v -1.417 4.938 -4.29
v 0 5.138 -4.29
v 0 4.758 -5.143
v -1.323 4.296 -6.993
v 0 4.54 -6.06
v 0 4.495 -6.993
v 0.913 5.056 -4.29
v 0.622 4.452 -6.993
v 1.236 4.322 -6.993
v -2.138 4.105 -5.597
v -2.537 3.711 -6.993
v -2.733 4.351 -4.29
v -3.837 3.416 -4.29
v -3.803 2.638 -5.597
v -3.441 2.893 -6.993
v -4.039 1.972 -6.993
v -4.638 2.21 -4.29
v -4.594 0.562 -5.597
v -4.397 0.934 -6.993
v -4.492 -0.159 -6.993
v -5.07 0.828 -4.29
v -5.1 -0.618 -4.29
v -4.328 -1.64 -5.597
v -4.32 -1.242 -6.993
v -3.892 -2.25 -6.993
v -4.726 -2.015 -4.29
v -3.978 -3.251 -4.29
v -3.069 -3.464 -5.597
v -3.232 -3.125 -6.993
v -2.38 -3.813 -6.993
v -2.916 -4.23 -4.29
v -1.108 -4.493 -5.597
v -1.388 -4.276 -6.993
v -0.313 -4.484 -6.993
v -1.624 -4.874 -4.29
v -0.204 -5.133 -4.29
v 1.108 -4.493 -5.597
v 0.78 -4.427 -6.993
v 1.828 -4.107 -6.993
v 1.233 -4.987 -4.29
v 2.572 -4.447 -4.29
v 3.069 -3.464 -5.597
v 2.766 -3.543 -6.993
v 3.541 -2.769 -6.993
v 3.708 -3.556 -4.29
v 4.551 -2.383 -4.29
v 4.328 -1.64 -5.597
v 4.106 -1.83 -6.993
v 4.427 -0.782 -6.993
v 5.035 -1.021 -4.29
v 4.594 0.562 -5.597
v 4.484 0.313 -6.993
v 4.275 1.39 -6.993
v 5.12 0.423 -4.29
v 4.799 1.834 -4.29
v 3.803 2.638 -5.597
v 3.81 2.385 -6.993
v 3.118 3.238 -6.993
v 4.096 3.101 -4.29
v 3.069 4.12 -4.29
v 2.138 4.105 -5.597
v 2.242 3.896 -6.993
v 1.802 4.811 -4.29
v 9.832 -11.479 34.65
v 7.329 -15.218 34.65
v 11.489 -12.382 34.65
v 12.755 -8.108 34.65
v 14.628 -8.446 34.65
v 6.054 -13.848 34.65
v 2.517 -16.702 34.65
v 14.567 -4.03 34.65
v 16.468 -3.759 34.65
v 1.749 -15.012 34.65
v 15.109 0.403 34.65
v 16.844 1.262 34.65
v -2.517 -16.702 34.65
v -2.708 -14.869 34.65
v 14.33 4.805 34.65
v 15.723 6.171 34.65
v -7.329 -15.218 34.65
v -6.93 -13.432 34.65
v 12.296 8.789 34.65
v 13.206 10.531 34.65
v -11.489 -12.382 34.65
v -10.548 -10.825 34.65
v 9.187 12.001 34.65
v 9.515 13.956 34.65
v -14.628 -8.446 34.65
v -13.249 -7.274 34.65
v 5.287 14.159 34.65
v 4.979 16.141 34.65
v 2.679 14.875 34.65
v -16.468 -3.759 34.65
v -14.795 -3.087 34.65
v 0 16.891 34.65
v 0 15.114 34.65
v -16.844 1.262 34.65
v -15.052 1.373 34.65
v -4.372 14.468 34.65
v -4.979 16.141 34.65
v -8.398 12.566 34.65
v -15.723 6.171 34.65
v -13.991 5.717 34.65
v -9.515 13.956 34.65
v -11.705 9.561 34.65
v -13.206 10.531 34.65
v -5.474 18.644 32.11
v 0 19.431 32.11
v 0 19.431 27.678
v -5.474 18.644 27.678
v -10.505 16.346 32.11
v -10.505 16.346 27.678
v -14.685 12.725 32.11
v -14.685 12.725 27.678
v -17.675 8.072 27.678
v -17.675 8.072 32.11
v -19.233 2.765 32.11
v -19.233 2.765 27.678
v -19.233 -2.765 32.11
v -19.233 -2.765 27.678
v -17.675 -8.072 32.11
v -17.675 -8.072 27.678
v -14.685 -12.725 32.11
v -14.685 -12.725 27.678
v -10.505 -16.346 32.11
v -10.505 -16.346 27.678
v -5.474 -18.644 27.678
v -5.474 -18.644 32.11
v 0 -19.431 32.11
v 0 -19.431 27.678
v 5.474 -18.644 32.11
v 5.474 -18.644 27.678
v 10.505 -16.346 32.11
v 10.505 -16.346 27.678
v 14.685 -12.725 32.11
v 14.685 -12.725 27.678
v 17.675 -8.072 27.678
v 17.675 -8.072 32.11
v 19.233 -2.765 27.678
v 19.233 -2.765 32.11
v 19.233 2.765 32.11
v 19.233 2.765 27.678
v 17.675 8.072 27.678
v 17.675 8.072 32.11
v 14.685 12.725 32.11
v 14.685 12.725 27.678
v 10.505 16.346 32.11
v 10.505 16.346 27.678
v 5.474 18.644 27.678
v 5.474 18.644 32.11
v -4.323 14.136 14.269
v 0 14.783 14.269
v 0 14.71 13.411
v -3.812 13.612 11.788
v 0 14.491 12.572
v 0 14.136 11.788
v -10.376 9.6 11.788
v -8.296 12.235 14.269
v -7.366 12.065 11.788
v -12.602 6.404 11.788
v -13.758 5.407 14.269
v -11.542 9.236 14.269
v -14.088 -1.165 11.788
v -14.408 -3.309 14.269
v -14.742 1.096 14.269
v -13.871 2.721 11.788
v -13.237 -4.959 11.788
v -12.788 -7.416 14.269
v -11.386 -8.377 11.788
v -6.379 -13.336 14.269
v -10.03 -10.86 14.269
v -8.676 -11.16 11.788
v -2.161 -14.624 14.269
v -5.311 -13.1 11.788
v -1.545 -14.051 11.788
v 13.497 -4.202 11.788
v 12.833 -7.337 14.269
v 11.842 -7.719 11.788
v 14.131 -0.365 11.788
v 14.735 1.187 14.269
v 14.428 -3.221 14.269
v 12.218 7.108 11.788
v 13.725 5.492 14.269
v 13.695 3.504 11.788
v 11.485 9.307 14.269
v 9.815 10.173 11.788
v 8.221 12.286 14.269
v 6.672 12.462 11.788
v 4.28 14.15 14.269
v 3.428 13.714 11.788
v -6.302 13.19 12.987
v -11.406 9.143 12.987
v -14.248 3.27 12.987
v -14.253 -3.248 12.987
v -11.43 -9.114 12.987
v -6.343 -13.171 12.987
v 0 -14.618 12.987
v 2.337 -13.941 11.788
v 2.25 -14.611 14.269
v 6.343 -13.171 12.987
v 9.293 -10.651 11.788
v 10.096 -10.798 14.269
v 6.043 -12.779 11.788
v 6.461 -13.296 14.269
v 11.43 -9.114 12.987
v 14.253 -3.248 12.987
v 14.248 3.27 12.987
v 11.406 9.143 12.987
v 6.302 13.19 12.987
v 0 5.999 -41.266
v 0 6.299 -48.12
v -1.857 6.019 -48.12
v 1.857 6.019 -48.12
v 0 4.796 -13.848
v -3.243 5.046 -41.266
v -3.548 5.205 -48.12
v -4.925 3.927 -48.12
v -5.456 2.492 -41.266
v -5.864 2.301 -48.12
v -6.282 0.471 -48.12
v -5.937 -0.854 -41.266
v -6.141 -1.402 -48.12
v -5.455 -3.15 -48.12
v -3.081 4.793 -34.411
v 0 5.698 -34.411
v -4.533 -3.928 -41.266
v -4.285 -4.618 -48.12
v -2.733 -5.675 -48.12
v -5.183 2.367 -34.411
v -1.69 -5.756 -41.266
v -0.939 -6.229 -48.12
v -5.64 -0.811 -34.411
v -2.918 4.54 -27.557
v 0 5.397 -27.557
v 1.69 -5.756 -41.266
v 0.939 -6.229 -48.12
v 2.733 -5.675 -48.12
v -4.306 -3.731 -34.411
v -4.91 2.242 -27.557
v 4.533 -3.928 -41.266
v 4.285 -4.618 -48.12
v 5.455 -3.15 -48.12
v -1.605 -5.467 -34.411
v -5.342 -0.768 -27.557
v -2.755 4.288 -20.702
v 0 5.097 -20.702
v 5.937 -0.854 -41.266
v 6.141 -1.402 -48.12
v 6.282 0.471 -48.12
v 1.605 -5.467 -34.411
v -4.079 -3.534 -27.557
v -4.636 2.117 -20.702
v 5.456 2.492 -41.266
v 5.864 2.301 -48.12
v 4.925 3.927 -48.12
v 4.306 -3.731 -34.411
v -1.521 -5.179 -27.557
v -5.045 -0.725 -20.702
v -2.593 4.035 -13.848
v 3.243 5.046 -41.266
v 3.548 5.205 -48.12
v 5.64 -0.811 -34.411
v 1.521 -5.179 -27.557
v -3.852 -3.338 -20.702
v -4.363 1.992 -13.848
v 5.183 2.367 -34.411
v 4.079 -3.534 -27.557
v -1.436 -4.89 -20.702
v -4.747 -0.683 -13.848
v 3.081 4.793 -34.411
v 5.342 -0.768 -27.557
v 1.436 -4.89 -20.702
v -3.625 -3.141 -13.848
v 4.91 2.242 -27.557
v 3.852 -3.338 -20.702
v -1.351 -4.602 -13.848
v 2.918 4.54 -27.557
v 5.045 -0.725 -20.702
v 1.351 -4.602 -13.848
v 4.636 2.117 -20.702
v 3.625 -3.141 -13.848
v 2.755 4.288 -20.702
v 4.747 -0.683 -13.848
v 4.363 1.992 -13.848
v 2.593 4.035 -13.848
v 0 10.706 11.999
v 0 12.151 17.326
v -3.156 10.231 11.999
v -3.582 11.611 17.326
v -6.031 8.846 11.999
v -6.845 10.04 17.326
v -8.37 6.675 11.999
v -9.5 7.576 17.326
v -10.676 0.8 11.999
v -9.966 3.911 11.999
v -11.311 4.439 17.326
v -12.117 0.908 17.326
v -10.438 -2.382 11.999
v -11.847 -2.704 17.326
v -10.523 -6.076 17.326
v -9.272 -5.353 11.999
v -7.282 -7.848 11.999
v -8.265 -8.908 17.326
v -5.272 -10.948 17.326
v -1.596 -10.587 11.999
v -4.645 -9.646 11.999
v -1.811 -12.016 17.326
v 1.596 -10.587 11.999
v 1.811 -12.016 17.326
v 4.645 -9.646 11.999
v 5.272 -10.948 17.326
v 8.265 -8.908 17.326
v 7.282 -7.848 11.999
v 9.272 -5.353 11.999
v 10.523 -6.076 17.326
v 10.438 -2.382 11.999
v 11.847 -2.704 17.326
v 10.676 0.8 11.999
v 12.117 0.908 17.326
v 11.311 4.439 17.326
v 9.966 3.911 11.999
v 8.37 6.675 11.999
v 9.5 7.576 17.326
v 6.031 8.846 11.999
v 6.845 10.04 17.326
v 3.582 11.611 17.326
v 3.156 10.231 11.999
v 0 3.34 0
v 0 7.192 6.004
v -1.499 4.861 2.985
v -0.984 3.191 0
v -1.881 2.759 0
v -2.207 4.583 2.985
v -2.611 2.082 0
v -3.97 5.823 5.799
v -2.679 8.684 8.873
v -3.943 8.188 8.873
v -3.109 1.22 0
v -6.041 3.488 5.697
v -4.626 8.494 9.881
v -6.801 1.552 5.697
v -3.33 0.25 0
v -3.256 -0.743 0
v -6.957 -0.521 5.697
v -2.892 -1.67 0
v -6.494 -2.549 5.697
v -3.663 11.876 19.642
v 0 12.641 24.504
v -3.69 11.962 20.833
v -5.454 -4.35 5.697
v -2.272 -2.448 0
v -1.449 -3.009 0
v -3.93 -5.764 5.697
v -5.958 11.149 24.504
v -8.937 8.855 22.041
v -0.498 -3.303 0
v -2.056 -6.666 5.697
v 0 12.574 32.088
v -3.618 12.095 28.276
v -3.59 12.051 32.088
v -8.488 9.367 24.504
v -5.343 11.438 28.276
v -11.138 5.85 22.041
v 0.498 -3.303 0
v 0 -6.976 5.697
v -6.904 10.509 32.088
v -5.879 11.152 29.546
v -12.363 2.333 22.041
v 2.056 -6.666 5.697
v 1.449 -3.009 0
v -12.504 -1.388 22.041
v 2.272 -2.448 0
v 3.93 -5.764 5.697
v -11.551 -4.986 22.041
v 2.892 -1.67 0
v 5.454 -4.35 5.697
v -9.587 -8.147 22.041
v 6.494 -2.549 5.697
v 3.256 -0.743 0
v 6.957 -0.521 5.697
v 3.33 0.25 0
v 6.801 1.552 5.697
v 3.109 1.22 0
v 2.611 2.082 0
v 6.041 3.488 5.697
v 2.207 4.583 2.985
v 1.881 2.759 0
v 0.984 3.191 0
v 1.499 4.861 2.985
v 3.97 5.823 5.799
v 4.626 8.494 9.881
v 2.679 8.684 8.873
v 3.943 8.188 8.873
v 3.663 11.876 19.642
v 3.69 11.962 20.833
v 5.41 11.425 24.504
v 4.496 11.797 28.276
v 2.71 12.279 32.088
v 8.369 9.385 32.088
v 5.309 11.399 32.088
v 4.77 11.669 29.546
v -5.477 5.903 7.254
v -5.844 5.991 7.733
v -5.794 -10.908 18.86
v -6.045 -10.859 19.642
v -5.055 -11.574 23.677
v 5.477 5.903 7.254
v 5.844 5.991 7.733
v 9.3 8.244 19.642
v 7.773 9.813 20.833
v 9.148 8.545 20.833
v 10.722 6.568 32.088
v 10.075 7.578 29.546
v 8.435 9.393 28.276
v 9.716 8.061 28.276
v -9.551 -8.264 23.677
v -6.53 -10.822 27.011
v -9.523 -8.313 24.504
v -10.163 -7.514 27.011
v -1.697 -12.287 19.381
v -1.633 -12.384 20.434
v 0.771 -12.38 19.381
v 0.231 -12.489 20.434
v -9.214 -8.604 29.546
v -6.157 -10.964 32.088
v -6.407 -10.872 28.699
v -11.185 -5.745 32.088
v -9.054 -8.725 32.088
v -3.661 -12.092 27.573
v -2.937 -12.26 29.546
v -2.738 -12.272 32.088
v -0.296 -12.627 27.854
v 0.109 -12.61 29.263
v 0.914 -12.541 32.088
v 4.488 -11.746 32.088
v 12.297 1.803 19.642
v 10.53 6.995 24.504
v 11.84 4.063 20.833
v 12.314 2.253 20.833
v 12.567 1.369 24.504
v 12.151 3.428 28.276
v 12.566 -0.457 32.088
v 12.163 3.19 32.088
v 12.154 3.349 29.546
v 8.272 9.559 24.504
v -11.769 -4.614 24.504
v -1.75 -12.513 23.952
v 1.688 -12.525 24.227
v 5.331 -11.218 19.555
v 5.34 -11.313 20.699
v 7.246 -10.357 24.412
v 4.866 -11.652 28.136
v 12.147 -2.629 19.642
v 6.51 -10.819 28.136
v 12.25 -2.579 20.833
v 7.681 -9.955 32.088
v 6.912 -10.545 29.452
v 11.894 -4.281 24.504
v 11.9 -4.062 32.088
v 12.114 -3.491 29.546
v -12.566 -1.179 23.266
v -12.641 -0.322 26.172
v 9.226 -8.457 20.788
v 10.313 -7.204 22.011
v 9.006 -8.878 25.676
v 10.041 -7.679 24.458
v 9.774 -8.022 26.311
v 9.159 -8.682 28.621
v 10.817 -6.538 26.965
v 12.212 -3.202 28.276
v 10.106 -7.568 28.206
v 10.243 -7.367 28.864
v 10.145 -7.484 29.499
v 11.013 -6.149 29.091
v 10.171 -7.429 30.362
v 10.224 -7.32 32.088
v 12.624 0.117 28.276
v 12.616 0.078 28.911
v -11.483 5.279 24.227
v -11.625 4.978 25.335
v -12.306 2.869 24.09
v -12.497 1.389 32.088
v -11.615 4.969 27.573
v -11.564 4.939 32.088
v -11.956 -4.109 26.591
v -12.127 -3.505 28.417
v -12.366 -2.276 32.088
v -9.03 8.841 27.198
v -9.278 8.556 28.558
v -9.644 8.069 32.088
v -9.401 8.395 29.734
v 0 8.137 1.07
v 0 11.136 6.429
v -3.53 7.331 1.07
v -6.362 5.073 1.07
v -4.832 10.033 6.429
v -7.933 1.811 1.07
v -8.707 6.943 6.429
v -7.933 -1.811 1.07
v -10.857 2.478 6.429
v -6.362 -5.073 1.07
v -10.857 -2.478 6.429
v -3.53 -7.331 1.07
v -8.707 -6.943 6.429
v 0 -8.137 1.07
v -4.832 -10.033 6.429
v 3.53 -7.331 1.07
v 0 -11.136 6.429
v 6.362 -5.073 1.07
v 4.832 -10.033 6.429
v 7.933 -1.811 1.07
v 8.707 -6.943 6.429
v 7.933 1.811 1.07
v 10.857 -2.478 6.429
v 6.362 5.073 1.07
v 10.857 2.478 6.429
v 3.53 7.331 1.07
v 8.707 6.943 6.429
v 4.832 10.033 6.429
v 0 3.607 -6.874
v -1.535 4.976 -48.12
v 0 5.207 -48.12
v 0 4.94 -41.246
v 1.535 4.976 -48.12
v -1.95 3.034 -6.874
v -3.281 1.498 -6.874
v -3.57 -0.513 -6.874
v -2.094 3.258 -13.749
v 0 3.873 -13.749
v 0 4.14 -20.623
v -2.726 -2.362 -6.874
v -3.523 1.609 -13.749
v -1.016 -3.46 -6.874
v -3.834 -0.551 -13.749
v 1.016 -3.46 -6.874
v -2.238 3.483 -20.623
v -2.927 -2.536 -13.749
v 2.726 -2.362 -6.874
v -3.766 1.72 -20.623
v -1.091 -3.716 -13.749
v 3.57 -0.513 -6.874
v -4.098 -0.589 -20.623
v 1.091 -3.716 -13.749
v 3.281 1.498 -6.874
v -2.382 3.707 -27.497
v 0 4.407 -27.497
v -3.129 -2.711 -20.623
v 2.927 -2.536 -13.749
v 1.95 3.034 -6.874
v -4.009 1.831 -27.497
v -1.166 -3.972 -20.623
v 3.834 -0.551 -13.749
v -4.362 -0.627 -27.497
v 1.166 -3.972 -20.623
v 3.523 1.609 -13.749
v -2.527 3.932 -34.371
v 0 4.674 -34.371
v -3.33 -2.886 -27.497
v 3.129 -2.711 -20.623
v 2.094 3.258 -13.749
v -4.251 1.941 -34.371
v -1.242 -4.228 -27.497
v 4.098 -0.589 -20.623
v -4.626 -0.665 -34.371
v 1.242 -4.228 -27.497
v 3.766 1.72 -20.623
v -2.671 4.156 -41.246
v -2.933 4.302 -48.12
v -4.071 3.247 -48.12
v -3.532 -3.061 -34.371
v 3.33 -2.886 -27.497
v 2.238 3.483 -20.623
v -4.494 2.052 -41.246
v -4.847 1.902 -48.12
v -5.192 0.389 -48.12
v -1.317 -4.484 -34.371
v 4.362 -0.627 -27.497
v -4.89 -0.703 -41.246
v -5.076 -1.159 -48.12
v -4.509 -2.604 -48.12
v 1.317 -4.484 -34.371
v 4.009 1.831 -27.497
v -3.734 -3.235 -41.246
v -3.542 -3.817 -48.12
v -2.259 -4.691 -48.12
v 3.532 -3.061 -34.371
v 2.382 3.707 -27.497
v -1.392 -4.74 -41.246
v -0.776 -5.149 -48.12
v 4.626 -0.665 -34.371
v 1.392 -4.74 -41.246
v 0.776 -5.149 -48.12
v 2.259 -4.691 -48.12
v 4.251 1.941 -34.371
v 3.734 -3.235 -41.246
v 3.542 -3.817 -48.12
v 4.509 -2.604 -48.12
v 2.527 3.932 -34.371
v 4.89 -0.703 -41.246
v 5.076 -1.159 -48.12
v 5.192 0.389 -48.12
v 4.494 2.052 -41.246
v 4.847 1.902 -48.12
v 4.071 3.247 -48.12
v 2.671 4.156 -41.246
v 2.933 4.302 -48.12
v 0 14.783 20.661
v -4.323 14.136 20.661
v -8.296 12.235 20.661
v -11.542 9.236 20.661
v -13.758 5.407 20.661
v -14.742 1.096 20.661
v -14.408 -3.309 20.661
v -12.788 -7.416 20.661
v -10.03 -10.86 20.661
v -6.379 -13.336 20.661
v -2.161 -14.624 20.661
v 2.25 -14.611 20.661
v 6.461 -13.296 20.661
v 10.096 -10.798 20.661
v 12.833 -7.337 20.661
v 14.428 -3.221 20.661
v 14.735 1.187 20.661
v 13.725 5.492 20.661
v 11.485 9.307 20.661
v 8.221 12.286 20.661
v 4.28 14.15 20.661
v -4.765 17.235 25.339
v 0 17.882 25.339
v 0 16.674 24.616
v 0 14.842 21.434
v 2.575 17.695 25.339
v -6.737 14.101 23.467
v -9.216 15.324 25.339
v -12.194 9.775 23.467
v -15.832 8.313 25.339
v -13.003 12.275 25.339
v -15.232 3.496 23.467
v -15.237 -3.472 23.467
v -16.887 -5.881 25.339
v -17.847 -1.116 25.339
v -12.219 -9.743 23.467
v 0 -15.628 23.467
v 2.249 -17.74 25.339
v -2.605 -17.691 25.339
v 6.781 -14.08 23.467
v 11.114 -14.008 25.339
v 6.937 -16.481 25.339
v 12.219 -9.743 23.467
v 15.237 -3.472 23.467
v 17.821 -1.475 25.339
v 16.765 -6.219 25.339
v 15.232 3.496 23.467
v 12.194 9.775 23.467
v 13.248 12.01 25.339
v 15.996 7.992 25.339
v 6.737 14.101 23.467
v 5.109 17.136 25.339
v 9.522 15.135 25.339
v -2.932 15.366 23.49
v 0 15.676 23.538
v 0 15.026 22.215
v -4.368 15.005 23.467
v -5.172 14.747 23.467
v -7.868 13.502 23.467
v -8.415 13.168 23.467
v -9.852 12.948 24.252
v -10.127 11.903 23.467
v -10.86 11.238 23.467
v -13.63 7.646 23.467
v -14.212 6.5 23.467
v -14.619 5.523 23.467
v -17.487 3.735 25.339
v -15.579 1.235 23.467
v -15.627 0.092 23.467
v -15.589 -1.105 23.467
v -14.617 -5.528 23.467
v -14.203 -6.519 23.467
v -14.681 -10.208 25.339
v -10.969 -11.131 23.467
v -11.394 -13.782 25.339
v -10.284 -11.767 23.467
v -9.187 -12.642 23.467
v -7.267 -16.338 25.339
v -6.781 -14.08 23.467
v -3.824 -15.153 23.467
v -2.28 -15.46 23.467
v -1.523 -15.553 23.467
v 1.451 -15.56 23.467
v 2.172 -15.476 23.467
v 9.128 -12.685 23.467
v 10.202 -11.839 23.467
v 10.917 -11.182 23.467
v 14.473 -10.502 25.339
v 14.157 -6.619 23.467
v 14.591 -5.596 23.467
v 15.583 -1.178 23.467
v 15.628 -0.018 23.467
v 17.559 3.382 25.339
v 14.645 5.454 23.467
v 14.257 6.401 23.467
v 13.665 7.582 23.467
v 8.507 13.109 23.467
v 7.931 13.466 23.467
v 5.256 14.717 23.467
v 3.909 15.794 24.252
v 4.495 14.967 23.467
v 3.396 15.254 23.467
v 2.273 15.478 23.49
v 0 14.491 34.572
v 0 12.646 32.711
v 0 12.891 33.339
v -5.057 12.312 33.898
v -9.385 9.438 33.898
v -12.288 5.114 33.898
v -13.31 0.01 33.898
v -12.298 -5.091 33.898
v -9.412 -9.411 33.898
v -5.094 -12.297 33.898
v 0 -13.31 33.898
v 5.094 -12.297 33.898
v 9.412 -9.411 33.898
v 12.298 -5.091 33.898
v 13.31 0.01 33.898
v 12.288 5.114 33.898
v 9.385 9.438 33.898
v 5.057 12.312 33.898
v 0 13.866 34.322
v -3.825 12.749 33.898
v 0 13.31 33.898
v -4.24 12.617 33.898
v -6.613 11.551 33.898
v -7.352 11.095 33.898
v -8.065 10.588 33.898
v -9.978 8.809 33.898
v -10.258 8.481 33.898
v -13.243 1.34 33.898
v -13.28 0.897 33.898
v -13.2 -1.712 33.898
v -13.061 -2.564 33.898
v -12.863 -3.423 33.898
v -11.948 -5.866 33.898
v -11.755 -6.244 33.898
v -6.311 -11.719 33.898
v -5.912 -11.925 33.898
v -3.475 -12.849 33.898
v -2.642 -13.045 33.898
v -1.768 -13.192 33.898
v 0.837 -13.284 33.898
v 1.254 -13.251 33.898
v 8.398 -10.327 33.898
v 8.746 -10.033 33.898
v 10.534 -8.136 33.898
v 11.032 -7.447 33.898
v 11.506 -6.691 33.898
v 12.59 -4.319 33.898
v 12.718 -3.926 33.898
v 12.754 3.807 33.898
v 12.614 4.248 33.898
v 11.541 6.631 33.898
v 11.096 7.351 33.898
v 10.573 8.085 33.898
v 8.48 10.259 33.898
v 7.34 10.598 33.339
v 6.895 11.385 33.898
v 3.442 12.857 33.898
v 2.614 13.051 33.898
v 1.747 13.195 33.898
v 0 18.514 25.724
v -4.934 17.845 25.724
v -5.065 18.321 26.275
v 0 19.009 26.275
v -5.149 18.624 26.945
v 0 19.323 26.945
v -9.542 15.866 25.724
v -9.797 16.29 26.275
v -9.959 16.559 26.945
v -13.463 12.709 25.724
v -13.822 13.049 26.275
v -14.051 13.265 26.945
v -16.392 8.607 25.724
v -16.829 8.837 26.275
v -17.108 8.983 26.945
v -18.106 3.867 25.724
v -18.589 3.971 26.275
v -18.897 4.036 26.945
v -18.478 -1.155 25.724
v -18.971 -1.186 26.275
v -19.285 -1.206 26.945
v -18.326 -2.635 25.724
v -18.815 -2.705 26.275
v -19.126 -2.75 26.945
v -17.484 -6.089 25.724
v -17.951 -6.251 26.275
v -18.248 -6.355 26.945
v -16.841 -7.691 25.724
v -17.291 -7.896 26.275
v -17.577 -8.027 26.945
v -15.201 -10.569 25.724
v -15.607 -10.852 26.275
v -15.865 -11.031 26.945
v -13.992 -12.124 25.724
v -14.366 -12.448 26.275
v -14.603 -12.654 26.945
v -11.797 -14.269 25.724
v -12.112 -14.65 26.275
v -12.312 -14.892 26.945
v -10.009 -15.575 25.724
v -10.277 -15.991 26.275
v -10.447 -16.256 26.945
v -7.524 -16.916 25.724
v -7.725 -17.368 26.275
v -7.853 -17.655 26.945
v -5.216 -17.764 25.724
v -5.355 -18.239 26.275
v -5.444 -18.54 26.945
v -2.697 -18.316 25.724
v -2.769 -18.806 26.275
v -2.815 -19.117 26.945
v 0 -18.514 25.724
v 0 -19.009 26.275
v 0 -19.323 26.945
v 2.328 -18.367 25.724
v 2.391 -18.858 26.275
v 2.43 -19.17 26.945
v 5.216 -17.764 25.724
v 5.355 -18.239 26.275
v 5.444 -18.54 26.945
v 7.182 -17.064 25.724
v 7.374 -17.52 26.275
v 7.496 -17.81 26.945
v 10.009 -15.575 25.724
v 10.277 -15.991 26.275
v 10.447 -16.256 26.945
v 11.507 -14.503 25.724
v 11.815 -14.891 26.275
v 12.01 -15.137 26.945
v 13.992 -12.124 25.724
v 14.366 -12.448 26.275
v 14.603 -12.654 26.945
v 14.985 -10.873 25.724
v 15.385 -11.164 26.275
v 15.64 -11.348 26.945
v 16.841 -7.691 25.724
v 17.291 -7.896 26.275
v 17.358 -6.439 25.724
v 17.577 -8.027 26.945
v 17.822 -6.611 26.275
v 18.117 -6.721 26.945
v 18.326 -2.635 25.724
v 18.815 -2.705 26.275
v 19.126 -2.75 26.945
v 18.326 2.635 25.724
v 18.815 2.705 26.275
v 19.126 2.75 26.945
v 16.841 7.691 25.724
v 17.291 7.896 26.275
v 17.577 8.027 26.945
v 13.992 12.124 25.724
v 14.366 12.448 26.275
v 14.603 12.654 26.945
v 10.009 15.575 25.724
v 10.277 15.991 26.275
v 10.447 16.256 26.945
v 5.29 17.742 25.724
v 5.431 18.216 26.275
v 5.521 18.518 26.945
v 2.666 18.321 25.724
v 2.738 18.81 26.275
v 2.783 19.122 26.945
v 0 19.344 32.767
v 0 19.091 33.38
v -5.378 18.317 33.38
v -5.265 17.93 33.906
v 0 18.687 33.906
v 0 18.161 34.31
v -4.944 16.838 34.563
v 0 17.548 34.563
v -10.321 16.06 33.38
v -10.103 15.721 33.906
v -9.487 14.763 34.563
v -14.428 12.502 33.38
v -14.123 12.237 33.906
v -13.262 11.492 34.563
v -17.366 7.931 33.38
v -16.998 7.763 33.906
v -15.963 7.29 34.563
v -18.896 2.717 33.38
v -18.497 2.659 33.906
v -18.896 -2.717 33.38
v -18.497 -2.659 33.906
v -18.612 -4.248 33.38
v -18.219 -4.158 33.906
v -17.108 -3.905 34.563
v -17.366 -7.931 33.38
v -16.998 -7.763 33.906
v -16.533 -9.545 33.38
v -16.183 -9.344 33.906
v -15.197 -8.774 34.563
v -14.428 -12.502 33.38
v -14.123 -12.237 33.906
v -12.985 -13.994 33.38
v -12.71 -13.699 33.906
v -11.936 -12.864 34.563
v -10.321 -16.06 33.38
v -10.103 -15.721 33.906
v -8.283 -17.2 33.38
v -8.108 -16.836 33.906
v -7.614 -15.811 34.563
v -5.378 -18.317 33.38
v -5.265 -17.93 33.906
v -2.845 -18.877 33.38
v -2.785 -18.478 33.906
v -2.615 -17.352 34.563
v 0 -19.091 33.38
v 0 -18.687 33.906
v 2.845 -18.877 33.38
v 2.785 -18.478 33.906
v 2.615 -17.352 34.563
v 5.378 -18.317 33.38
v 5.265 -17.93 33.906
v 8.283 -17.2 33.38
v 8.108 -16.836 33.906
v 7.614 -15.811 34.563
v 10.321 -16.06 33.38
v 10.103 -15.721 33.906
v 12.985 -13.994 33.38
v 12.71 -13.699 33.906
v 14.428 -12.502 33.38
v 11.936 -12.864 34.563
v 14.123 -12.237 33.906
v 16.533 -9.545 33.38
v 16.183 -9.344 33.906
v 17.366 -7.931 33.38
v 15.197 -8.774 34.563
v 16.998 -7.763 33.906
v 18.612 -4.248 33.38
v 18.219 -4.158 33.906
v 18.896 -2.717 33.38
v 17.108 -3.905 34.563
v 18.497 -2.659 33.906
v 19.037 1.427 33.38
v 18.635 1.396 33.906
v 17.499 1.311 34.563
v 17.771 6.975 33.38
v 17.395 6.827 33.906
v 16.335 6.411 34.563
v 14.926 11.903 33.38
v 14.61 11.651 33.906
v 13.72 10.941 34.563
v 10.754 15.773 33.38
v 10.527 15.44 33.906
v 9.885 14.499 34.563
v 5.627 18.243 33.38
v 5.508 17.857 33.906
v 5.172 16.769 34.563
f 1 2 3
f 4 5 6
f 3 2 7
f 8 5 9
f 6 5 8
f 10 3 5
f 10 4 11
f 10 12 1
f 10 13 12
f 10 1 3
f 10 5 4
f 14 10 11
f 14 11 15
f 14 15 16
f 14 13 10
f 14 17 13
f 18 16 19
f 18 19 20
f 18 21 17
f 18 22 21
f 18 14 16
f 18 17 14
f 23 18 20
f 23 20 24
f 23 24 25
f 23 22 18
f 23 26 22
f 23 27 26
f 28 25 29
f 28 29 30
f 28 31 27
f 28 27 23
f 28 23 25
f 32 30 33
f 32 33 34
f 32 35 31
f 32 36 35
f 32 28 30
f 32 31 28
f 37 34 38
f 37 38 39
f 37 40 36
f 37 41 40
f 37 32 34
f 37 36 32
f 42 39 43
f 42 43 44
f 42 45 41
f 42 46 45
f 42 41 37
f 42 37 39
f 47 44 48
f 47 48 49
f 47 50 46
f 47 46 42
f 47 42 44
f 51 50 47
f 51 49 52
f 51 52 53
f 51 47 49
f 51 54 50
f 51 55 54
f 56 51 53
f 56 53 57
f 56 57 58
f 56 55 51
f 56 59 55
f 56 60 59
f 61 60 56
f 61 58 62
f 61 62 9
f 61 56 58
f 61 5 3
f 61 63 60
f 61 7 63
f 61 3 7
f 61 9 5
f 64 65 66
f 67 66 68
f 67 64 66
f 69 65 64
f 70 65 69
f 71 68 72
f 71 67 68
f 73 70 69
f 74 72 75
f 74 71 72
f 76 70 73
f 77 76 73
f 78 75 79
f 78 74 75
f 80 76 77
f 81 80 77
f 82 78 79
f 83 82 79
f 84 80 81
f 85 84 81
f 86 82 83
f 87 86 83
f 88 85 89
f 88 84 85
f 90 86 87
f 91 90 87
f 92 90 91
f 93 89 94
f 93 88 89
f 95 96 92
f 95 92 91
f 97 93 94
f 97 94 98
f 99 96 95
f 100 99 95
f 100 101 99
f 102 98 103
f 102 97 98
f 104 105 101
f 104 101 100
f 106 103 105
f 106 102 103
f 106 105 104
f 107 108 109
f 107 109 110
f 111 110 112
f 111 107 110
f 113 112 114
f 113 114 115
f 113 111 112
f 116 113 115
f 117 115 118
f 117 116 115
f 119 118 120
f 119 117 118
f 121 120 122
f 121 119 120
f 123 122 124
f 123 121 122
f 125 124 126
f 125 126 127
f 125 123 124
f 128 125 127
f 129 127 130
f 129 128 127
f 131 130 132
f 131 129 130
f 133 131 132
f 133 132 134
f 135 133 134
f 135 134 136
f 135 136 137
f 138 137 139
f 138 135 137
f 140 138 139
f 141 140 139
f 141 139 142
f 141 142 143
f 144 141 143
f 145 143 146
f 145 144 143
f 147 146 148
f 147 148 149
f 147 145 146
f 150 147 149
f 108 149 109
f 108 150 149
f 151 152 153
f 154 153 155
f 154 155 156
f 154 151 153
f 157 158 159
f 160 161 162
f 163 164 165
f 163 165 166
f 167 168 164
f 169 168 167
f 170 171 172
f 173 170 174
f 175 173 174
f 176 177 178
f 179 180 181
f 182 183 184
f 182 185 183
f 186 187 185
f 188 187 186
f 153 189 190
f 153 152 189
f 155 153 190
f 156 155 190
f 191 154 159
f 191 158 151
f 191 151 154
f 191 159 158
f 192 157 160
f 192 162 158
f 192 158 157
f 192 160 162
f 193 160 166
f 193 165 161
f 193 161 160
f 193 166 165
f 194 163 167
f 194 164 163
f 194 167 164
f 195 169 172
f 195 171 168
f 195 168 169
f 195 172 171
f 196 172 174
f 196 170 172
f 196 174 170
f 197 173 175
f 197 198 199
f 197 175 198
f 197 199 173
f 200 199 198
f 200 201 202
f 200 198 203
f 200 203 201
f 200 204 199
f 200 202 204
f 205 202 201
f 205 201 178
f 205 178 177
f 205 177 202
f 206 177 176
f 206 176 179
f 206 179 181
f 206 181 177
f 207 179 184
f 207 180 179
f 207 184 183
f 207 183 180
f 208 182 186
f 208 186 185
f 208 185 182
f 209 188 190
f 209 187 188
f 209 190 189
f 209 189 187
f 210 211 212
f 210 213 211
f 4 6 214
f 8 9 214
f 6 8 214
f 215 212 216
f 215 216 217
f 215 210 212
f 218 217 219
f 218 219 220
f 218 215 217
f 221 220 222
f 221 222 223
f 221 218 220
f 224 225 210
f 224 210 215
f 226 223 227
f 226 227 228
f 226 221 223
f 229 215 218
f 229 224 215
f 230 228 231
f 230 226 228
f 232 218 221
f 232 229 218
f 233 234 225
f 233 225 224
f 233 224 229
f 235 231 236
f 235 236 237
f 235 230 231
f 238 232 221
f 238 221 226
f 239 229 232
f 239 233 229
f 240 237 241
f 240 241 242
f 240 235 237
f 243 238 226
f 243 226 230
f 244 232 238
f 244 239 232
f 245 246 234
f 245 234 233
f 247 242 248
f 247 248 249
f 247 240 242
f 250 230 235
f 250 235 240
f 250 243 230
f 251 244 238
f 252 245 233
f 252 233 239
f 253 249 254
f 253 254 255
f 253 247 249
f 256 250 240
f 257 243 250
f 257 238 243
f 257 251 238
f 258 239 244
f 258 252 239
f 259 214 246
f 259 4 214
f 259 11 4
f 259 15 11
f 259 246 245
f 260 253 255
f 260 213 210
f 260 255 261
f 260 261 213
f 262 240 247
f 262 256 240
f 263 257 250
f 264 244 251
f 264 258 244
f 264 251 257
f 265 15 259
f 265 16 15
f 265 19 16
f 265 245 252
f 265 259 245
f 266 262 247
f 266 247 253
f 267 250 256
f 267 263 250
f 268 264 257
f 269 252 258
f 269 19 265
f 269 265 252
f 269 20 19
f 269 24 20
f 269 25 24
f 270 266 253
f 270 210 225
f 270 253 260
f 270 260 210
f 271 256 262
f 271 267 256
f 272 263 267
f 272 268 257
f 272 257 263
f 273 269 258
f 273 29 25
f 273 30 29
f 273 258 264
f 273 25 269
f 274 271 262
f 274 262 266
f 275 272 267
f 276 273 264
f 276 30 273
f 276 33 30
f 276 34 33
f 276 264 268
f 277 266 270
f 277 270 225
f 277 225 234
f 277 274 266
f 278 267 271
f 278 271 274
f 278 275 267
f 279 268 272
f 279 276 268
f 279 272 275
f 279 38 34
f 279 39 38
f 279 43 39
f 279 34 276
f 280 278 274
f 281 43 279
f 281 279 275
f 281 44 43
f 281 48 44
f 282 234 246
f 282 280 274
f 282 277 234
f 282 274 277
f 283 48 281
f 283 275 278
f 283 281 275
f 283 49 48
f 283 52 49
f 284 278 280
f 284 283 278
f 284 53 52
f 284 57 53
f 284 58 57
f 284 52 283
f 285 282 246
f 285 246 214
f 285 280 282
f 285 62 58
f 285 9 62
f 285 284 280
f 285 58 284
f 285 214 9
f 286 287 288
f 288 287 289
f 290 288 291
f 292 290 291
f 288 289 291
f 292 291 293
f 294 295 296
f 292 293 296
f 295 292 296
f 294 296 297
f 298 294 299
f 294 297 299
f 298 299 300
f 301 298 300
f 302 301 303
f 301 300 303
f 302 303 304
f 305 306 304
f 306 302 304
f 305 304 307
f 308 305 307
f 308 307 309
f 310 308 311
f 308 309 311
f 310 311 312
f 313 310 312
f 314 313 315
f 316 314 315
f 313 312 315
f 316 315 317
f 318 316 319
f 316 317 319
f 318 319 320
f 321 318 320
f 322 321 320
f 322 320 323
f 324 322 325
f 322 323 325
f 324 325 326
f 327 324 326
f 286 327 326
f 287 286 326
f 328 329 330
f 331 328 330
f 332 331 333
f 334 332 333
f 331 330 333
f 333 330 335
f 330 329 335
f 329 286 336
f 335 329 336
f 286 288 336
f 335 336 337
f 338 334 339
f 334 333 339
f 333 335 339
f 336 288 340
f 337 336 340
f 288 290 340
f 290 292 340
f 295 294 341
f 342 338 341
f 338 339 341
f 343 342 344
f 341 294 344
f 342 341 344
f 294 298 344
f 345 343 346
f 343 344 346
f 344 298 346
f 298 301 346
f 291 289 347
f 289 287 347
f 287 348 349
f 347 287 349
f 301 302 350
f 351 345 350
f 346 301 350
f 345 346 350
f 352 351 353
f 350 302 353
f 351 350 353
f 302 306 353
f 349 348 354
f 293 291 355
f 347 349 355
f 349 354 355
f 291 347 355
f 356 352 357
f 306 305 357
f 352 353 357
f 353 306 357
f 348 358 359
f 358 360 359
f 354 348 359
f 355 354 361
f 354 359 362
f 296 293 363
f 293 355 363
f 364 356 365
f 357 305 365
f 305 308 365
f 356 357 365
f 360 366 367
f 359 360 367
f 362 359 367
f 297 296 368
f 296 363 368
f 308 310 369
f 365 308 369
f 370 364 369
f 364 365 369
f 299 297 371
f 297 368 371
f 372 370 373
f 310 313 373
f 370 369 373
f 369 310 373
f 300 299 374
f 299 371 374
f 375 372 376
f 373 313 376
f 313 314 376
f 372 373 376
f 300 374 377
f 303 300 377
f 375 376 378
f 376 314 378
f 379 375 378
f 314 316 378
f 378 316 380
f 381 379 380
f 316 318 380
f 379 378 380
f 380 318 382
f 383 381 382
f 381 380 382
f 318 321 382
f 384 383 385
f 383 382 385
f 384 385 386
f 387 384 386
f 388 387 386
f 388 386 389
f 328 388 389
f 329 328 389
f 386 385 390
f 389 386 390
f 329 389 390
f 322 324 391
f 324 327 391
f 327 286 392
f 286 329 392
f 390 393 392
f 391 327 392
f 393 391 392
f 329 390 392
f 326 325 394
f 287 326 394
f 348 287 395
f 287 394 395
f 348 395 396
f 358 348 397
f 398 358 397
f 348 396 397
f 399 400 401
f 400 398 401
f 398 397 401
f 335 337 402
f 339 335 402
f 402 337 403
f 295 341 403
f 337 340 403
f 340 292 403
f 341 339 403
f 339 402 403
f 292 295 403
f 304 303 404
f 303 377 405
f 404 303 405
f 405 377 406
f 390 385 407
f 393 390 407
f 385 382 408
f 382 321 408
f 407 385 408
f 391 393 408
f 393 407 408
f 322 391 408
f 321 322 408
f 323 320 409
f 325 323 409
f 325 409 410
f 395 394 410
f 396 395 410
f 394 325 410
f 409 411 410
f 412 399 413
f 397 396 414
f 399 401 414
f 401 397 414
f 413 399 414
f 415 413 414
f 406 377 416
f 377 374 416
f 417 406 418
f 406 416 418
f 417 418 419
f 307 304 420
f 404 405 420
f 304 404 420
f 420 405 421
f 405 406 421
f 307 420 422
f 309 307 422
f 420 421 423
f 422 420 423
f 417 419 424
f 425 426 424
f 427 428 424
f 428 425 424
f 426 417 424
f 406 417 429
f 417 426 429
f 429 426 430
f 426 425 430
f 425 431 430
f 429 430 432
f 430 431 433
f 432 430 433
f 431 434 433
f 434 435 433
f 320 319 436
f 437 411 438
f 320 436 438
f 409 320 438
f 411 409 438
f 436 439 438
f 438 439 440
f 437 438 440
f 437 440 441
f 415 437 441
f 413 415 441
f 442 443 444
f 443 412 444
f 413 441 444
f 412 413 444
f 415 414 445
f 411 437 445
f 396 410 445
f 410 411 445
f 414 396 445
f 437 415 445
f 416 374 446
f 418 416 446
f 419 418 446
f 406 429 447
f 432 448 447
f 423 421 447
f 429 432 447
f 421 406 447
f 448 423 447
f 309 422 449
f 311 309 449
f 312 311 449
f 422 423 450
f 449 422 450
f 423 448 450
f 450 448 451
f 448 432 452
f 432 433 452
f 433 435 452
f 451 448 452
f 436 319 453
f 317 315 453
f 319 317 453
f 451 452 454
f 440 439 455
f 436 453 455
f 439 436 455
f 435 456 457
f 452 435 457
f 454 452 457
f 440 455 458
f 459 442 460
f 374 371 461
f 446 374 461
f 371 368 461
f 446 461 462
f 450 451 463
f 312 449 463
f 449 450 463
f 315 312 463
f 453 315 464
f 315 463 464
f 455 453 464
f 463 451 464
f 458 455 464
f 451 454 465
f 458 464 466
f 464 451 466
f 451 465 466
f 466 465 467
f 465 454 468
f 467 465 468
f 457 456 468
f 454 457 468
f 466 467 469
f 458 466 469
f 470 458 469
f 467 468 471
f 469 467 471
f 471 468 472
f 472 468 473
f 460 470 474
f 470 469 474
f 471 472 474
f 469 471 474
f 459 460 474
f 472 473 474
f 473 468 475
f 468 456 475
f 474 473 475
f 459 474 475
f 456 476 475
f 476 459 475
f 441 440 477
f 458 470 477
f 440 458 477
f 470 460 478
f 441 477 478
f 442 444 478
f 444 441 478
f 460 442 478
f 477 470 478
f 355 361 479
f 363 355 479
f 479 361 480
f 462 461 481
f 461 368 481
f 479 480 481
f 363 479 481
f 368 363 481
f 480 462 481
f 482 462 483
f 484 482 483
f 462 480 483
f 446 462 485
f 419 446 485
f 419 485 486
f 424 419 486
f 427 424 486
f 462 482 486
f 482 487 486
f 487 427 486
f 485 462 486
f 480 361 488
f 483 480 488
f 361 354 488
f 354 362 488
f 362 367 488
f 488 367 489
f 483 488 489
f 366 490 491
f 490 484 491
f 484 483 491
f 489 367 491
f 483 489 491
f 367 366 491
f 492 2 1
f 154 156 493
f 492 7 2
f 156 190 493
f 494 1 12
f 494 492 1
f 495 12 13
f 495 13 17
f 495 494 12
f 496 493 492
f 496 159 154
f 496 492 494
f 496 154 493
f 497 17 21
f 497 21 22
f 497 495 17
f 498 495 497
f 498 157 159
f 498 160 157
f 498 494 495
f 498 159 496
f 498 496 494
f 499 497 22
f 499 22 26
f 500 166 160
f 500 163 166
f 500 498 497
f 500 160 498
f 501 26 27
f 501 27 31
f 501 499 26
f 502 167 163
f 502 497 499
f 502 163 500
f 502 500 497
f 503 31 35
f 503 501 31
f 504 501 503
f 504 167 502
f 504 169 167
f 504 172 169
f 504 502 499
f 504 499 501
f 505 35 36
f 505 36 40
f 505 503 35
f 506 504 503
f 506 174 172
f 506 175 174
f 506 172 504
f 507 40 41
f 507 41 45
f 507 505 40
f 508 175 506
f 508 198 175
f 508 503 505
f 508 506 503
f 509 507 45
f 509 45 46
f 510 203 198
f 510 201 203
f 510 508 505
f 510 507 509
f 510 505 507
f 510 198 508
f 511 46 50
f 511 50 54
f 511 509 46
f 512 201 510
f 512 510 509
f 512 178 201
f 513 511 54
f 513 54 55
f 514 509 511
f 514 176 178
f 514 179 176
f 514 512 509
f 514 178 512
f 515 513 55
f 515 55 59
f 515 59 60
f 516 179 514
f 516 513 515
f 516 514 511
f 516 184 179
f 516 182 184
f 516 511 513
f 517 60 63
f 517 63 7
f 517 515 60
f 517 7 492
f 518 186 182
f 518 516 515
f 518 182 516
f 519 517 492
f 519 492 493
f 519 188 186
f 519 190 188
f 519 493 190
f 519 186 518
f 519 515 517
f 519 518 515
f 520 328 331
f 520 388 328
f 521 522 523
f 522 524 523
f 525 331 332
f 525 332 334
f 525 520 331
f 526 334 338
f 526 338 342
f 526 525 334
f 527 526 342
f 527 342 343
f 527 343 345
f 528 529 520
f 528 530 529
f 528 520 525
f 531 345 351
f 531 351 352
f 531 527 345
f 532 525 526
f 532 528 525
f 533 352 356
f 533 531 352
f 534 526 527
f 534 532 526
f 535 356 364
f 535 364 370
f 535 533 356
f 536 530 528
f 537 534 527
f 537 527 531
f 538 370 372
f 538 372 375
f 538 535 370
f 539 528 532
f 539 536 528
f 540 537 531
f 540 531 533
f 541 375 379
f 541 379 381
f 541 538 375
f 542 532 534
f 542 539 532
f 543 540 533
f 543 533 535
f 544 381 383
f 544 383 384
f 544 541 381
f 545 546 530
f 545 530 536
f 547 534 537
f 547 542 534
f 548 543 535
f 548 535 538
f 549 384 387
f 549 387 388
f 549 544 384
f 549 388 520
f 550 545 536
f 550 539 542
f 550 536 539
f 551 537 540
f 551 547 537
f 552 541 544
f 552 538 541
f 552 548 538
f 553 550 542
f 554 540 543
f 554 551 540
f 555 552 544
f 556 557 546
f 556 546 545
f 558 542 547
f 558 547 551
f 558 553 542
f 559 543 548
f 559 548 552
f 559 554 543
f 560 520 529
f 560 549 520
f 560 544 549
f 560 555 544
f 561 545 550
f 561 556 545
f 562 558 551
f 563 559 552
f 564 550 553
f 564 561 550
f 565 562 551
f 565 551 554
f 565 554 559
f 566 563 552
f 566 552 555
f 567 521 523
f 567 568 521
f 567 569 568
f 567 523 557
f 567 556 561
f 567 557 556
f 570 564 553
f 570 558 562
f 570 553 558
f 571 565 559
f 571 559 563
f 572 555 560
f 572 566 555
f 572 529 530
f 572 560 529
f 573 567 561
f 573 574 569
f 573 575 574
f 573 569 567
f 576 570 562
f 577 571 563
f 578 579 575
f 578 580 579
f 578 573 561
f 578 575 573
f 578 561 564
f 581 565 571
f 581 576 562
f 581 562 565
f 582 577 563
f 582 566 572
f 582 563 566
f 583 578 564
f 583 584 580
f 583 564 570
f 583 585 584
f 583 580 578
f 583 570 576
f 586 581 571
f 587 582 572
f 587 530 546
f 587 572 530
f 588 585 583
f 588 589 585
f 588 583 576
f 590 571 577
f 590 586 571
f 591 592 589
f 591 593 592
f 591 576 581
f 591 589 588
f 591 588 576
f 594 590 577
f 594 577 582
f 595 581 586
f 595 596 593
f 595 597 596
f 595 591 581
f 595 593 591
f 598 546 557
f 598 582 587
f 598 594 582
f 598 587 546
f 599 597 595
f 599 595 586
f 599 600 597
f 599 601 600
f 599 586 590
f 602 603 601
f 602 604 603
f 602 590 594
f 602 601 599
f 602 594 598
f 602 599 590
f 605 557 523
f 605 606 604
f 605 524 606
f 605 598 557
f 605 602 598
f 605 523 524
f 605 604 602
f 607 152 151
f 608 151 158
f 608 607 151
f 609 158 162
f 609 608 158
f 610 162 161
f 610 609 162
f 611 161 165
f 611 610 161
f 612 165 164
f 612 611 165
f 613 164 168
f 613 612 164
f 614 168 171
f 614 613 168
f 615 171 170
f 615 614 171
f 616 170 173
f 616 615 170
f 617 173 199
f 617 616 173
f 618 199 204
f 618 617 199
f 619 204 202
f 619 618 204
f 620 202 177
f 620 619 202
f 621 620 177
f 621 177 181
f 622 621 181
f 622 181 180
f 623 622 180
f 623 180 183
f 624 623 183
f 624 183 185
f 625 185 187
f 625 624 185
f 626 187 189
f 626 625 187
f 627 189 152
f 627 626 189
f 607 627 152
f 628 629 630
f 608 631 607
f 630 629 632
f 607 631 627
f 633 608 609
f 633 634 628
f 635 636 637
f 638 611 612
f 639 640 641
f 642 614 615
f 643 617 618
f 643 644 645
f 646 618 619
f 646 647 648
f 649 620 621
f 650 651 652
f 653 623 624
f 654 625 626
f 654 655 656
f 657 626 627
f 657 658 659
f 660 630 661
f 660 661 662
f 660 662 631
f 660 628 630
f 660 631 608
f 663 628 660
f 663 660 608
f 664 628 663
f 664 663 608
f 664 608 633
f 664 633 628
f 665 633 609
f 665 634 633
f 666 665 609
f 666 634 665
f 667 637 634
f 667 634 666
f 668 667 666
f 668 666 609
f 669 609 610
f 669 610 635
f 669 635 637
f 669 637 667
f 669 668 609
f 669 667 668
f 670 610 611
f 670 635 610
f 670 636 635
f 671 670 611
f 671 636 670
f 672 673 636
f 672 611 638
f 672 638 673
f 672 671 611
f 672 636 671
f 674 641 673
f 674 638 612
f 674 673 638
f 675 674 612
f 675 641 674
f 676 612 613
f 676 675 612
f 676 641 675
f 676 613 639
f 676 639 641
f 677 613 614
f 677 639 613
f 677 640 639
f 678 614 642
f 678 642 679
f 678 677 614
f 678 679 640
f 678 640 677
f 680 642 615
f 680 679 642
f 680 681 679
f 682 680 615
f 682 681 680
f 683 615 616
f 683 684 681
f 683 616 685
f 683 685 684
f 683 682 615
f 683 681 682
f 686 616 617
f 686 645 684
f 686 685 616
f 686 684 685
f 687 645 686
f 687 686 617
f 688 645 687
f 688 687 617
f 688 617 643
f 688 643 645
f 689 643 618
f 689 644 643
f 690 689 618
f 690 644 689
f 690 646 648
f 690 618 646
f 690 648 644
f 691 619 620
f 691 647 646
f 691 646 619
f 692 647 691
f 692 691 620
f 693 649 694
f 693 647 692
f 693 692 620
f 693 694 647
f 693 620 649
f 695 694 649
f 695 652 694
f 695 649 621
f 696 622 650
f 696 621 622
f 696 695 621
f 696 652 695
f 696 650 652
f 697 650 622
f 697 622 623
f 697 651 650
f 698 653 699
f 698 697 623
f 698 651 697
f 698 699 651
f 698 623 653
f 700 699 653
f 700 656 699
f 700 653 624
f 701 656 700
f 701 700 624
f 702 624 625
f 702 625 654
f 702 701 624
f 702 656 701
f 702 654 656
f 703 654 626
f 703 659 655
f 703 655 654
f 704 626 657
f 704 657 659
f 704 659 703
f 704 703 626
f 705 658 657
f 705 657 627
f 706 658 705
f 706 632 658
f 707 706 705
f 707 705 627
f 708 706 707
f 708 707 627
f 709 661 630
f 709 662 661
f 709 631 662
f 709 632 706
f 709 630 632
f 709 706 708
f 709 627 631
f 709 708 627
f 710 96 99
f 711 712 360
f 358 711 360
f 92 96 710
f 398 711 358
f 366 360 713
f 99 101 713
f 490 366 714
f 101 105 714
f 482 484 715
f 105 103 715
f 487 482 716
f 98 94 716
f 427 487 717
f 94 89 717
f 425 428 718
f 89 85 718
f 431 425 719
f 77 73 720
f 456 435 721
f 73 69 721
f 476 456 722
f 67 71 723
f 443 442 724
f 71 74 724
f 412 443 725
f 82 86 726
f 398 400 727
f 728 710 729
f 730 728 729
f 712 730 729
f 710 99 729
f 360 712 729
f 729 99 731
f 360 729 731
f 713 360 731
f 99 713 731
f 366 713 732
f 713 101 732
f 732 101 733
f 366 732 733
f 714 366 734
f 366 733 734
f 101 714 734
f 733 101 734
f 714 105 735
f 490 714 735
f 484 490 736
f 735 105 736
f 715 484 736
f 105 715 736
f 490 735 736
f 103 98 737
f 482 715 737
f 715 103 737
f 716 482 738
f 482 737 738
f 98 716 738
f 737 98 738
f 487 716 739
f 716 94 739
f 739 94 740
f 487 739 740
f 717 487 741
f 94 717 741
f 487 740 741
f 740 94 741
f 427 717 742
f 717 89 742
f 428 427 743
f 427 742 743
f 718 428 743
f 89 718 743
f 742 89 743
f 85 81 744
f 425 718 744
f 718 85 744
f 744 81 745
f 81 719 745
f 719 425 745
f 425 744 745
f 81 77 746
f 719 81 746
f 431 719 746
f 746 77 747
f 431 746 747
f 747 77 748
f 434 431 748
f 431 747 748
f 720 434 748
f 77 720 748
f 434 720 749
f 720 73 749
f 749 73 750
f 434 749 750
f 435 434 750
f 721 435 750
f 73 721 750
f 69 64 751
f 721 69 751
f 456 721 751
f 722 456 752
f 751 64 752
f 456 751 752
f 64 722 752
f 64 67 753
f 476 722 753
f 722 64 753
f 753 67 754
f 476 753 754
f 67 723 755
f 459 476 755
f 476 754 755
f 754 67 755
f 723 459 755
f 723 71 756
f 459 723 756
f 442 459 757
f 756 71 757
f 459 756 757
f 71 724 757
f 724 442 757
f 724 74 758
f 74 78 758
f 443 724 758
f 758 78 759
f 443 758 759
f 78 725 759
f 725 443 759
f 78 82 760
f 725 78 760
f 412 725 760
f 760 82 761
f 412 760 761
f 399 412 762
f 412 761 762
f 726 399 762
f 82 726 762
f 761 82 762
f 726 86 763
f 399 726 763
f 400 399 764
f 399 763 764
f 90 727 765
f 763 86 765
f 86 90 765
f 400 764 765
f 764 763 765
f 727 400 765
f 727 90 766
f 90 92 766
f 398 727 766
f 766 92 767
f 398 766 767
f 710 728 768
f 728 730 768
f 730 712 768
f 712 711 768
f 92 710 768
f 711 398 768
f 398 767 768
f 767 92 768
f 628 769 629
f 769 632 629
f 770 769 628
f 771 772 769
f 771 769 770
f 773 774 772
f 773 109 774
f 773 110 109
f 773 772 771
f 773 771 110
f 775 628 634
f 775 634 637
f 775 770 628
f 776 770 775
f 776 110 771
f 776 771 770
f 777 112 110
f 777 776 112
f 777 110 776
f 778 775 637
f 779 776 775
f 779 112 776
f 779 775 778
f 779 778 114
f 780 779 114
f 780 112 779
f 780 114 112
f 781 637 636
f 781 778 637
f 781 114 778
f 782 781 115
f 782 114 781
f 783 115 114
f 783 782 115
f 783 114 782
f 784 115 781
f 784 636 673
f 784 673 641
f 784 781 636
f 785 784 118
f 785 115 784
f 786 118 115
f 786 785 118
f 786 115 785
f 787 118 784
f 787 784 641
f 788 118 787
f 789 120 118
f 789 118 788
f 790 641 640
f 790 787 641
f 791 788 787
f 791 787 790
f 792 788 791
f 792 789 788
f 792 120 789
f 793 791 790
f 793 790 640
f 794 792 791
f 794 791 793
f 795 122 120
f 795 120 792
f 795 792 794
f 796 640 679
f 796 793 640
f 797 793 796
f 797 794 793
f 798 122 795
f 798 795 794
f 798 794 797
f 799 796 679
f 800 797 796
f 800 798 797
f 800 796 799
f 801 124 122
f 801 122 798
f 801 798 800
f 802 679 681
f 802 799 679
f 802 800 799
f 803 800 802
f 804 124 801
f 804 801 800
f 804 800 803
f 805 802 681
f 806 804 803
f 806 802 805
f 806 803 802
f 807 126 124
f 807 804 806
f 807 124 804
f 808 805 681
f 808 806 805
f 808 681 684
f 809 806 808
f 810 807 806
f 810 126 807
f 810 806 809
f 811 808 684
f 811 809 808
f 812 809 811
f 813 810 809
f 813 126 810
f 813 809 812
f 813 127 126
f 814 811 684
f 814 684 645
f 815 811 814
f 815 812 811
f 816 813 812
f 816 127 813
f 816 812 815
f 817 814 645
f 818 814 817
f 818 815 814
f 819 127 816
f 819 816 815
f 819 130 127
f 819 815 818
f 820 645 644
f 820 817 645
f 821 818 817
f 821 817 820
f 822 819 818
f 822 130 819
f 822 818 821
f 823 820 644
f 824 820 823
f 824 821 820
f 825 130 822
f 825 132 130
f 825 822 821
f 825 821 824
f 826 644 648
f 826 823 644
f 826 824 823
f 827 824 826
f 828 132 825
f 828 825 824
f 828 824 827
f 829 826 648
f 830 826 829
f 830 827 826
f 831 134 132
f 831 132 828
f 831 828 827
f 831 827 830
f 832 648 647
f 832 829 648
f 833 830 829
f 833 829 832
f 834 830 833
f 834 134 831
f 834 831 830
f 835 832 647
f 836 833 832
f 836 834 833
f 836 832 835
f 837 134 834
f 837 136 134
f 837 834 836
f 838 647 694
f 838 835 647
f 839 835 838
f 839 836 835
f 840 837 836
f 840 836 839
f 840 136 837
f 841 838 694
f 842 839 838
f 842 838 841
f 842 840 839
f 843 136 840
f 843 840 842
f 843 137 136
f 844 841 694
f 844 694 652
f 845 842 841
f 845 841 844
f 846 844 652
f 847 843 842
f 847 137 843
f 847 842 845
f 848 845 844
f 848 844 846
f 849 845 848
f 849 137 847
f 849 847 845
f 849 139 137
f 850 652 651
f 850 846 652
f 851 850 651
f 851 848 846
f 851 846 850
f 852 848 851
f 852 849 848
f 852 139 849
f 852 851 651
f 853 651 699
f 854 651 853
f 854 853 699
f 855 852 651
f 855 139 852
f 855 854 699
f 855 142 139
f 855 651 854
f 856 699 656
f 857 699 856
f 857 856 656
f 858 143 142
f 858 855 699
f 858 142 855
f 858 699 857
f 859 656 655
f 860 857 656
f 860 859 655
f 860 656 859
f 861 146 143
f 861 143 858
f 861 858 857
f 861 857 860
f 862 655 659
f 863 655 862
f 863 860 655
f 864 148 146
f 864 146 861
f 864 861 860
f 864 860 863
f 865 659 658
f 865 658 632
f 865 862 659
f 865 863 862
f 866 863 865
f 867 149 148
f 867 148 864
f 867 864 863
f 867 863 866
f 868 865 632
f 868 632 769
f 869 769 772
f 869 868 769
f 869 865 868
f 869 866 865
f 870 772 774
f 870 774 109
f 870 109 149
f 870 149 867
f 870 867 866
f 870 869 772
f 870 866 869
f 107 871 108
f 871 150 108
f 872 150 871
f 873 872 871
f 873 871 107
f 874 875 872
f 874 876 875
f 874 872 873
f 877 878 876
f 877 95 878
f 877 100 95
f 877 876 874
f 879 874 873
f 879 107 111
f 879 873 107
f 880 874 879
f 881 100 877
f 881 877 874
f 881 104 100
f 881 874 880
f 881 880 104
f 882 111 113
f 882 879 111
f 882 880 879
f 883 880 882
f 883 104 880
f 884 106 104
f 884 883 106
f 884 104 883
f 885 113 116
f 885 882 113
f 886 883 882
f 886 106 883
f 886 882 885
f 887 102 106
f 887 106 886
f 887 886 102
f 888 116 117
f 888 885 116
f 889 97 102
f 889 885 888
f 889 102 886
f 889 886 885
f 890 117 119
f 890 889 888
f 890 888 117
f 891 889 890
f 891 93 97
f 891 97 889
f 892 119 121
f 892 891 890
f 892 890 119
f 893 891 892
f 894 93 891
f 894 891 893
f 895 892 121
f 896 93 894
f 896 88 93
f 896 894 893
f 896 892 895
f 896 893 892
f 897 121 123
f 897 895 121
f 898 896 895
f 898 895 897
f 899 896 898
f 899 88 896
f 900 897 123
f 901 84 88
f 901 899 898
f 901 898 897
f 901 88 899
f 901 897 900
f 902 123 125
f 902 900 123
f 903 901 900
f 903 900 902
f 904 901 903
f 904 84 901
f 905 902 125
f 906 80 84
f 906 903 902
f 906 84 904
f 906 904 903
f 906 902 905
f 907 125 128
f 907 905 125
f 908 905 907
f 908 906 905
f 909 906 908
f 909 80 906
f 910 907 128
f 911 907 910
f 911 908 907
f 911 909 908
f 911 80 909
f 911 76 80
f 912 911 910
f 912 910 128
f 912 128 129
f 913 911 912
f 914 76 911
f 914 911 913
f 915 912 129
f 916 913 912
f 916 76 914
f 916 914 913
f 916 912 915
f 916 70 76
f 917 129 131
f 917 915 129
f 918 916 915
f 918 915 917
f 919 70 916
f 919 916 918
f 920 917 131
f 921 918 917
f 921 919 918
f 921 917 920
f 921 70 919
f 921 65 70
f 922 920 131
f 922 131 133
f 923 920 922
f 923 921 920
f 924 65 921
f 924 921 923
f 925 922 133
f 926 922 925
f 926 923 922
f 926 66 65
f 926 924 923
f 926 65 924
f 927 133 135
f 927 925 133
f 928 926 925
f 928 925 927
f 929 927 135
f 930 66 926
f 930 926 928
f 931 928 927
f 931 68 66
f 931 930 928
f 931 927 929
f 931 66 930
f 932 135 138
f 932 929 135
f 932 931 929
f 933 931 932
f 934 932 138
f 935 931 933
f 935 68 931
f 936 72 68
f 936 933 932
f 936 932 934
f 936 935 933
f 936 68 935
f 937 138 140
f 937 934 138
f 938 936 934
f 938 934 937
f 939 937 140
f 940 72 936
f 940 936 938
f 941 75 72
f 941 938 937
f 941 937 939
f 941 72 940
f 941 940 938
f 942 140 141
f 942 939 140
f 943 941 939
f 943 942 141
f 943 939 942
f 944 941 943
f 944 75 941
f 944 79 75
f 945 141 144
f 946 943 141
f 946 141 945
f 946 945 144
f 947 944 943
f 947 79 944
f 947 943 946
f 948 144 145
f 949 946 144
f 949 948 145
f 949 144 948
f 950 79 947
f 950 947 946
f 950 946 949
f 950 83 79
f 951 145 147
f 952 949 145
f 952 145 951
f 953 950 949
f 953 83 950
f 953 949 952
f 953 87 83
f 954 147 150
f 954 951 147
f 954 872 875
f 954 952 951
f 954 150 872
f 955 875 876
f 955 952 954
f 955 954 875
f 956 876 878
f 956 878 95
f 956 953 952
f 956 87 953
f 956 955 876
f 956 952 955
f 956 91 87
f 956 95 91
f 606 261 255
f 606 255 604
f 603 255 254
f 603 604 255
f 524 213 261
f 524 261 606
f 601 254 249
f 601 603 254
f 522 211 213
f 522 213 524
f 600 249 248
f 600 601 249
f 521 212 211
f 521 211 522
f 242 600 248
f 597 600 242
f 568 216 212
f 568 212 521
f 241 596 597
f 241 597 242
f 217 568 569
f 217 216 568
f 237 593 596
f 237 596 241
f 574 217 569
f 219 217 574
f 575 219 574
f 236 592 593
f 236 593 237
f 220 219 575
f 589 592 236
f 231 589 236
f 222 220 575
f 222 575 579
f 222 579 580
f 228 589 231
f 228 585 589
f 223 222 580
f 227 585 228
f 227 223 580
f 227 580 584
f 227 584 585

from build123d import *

# Parameters (mm, degrees)
F2_R = 2.54
F3_R = 5.08


with BuildPart() as f1:
    # F0 (on Right) → F1 (revolve)
    with BuildSketch(Plane.YZ):
        with BuildLine():
            Line((6.2992, -48.12), (4.4320033194, -5.5500445782))
            Line((4.4320033194, -5.5500445782), (14.7828, 12.9437427968))
            Line((14.7828, 12.9437427968), (14.7828, 25.1377))
            Line((14.7828, 25.1377), (19.431, 25.1377))
            Line((19.431, 25.1377), (19.431, 34.65))
            Line((19.431, 34.65), (12.573, 34.65))
            add(Edge.make_bspline(
                [(3.3398033194, 0), (5.2834041409, 4.0609219444), (13.9291986198, 12.3239642156), (12.4965674617, 27.0232269442), (12.573, 34.65)],
                knots=[0, 0, 0, 0, 0.4533021056, 1, 1, 1, 1], degree=3))
            Line((3.3398033194, 0), (5.207, -48.12))
            Line((5.207, -48.12), (6.2992, -48.12))
        make_face()
    revolve(axis=Axis((0, 0, 17.325), (0, 0, 1)))

    # F2
    f2_edges = [f1.edges().sort_by_distance(p)[0] for p in [
        (0, -19.431, 34.65),
        (0, -12.573, 34.65),
        (0, -19.431, 25.1377),
    ]]
    fillet(f2_edges, radius=F2_R)

    # F3
    f3_edges = [f1.edges().sort_by_distance(p)[0] for p in [
        (0, -14.7828, 25.1377),
        (0, -14.7828, 12.943743),
        (0, -4.432003, -5.550045),
        (0, 9.607402, 3.696849),
    ]]
    fillet(f3_edges, radius=F3_R)


solid = f1.part
